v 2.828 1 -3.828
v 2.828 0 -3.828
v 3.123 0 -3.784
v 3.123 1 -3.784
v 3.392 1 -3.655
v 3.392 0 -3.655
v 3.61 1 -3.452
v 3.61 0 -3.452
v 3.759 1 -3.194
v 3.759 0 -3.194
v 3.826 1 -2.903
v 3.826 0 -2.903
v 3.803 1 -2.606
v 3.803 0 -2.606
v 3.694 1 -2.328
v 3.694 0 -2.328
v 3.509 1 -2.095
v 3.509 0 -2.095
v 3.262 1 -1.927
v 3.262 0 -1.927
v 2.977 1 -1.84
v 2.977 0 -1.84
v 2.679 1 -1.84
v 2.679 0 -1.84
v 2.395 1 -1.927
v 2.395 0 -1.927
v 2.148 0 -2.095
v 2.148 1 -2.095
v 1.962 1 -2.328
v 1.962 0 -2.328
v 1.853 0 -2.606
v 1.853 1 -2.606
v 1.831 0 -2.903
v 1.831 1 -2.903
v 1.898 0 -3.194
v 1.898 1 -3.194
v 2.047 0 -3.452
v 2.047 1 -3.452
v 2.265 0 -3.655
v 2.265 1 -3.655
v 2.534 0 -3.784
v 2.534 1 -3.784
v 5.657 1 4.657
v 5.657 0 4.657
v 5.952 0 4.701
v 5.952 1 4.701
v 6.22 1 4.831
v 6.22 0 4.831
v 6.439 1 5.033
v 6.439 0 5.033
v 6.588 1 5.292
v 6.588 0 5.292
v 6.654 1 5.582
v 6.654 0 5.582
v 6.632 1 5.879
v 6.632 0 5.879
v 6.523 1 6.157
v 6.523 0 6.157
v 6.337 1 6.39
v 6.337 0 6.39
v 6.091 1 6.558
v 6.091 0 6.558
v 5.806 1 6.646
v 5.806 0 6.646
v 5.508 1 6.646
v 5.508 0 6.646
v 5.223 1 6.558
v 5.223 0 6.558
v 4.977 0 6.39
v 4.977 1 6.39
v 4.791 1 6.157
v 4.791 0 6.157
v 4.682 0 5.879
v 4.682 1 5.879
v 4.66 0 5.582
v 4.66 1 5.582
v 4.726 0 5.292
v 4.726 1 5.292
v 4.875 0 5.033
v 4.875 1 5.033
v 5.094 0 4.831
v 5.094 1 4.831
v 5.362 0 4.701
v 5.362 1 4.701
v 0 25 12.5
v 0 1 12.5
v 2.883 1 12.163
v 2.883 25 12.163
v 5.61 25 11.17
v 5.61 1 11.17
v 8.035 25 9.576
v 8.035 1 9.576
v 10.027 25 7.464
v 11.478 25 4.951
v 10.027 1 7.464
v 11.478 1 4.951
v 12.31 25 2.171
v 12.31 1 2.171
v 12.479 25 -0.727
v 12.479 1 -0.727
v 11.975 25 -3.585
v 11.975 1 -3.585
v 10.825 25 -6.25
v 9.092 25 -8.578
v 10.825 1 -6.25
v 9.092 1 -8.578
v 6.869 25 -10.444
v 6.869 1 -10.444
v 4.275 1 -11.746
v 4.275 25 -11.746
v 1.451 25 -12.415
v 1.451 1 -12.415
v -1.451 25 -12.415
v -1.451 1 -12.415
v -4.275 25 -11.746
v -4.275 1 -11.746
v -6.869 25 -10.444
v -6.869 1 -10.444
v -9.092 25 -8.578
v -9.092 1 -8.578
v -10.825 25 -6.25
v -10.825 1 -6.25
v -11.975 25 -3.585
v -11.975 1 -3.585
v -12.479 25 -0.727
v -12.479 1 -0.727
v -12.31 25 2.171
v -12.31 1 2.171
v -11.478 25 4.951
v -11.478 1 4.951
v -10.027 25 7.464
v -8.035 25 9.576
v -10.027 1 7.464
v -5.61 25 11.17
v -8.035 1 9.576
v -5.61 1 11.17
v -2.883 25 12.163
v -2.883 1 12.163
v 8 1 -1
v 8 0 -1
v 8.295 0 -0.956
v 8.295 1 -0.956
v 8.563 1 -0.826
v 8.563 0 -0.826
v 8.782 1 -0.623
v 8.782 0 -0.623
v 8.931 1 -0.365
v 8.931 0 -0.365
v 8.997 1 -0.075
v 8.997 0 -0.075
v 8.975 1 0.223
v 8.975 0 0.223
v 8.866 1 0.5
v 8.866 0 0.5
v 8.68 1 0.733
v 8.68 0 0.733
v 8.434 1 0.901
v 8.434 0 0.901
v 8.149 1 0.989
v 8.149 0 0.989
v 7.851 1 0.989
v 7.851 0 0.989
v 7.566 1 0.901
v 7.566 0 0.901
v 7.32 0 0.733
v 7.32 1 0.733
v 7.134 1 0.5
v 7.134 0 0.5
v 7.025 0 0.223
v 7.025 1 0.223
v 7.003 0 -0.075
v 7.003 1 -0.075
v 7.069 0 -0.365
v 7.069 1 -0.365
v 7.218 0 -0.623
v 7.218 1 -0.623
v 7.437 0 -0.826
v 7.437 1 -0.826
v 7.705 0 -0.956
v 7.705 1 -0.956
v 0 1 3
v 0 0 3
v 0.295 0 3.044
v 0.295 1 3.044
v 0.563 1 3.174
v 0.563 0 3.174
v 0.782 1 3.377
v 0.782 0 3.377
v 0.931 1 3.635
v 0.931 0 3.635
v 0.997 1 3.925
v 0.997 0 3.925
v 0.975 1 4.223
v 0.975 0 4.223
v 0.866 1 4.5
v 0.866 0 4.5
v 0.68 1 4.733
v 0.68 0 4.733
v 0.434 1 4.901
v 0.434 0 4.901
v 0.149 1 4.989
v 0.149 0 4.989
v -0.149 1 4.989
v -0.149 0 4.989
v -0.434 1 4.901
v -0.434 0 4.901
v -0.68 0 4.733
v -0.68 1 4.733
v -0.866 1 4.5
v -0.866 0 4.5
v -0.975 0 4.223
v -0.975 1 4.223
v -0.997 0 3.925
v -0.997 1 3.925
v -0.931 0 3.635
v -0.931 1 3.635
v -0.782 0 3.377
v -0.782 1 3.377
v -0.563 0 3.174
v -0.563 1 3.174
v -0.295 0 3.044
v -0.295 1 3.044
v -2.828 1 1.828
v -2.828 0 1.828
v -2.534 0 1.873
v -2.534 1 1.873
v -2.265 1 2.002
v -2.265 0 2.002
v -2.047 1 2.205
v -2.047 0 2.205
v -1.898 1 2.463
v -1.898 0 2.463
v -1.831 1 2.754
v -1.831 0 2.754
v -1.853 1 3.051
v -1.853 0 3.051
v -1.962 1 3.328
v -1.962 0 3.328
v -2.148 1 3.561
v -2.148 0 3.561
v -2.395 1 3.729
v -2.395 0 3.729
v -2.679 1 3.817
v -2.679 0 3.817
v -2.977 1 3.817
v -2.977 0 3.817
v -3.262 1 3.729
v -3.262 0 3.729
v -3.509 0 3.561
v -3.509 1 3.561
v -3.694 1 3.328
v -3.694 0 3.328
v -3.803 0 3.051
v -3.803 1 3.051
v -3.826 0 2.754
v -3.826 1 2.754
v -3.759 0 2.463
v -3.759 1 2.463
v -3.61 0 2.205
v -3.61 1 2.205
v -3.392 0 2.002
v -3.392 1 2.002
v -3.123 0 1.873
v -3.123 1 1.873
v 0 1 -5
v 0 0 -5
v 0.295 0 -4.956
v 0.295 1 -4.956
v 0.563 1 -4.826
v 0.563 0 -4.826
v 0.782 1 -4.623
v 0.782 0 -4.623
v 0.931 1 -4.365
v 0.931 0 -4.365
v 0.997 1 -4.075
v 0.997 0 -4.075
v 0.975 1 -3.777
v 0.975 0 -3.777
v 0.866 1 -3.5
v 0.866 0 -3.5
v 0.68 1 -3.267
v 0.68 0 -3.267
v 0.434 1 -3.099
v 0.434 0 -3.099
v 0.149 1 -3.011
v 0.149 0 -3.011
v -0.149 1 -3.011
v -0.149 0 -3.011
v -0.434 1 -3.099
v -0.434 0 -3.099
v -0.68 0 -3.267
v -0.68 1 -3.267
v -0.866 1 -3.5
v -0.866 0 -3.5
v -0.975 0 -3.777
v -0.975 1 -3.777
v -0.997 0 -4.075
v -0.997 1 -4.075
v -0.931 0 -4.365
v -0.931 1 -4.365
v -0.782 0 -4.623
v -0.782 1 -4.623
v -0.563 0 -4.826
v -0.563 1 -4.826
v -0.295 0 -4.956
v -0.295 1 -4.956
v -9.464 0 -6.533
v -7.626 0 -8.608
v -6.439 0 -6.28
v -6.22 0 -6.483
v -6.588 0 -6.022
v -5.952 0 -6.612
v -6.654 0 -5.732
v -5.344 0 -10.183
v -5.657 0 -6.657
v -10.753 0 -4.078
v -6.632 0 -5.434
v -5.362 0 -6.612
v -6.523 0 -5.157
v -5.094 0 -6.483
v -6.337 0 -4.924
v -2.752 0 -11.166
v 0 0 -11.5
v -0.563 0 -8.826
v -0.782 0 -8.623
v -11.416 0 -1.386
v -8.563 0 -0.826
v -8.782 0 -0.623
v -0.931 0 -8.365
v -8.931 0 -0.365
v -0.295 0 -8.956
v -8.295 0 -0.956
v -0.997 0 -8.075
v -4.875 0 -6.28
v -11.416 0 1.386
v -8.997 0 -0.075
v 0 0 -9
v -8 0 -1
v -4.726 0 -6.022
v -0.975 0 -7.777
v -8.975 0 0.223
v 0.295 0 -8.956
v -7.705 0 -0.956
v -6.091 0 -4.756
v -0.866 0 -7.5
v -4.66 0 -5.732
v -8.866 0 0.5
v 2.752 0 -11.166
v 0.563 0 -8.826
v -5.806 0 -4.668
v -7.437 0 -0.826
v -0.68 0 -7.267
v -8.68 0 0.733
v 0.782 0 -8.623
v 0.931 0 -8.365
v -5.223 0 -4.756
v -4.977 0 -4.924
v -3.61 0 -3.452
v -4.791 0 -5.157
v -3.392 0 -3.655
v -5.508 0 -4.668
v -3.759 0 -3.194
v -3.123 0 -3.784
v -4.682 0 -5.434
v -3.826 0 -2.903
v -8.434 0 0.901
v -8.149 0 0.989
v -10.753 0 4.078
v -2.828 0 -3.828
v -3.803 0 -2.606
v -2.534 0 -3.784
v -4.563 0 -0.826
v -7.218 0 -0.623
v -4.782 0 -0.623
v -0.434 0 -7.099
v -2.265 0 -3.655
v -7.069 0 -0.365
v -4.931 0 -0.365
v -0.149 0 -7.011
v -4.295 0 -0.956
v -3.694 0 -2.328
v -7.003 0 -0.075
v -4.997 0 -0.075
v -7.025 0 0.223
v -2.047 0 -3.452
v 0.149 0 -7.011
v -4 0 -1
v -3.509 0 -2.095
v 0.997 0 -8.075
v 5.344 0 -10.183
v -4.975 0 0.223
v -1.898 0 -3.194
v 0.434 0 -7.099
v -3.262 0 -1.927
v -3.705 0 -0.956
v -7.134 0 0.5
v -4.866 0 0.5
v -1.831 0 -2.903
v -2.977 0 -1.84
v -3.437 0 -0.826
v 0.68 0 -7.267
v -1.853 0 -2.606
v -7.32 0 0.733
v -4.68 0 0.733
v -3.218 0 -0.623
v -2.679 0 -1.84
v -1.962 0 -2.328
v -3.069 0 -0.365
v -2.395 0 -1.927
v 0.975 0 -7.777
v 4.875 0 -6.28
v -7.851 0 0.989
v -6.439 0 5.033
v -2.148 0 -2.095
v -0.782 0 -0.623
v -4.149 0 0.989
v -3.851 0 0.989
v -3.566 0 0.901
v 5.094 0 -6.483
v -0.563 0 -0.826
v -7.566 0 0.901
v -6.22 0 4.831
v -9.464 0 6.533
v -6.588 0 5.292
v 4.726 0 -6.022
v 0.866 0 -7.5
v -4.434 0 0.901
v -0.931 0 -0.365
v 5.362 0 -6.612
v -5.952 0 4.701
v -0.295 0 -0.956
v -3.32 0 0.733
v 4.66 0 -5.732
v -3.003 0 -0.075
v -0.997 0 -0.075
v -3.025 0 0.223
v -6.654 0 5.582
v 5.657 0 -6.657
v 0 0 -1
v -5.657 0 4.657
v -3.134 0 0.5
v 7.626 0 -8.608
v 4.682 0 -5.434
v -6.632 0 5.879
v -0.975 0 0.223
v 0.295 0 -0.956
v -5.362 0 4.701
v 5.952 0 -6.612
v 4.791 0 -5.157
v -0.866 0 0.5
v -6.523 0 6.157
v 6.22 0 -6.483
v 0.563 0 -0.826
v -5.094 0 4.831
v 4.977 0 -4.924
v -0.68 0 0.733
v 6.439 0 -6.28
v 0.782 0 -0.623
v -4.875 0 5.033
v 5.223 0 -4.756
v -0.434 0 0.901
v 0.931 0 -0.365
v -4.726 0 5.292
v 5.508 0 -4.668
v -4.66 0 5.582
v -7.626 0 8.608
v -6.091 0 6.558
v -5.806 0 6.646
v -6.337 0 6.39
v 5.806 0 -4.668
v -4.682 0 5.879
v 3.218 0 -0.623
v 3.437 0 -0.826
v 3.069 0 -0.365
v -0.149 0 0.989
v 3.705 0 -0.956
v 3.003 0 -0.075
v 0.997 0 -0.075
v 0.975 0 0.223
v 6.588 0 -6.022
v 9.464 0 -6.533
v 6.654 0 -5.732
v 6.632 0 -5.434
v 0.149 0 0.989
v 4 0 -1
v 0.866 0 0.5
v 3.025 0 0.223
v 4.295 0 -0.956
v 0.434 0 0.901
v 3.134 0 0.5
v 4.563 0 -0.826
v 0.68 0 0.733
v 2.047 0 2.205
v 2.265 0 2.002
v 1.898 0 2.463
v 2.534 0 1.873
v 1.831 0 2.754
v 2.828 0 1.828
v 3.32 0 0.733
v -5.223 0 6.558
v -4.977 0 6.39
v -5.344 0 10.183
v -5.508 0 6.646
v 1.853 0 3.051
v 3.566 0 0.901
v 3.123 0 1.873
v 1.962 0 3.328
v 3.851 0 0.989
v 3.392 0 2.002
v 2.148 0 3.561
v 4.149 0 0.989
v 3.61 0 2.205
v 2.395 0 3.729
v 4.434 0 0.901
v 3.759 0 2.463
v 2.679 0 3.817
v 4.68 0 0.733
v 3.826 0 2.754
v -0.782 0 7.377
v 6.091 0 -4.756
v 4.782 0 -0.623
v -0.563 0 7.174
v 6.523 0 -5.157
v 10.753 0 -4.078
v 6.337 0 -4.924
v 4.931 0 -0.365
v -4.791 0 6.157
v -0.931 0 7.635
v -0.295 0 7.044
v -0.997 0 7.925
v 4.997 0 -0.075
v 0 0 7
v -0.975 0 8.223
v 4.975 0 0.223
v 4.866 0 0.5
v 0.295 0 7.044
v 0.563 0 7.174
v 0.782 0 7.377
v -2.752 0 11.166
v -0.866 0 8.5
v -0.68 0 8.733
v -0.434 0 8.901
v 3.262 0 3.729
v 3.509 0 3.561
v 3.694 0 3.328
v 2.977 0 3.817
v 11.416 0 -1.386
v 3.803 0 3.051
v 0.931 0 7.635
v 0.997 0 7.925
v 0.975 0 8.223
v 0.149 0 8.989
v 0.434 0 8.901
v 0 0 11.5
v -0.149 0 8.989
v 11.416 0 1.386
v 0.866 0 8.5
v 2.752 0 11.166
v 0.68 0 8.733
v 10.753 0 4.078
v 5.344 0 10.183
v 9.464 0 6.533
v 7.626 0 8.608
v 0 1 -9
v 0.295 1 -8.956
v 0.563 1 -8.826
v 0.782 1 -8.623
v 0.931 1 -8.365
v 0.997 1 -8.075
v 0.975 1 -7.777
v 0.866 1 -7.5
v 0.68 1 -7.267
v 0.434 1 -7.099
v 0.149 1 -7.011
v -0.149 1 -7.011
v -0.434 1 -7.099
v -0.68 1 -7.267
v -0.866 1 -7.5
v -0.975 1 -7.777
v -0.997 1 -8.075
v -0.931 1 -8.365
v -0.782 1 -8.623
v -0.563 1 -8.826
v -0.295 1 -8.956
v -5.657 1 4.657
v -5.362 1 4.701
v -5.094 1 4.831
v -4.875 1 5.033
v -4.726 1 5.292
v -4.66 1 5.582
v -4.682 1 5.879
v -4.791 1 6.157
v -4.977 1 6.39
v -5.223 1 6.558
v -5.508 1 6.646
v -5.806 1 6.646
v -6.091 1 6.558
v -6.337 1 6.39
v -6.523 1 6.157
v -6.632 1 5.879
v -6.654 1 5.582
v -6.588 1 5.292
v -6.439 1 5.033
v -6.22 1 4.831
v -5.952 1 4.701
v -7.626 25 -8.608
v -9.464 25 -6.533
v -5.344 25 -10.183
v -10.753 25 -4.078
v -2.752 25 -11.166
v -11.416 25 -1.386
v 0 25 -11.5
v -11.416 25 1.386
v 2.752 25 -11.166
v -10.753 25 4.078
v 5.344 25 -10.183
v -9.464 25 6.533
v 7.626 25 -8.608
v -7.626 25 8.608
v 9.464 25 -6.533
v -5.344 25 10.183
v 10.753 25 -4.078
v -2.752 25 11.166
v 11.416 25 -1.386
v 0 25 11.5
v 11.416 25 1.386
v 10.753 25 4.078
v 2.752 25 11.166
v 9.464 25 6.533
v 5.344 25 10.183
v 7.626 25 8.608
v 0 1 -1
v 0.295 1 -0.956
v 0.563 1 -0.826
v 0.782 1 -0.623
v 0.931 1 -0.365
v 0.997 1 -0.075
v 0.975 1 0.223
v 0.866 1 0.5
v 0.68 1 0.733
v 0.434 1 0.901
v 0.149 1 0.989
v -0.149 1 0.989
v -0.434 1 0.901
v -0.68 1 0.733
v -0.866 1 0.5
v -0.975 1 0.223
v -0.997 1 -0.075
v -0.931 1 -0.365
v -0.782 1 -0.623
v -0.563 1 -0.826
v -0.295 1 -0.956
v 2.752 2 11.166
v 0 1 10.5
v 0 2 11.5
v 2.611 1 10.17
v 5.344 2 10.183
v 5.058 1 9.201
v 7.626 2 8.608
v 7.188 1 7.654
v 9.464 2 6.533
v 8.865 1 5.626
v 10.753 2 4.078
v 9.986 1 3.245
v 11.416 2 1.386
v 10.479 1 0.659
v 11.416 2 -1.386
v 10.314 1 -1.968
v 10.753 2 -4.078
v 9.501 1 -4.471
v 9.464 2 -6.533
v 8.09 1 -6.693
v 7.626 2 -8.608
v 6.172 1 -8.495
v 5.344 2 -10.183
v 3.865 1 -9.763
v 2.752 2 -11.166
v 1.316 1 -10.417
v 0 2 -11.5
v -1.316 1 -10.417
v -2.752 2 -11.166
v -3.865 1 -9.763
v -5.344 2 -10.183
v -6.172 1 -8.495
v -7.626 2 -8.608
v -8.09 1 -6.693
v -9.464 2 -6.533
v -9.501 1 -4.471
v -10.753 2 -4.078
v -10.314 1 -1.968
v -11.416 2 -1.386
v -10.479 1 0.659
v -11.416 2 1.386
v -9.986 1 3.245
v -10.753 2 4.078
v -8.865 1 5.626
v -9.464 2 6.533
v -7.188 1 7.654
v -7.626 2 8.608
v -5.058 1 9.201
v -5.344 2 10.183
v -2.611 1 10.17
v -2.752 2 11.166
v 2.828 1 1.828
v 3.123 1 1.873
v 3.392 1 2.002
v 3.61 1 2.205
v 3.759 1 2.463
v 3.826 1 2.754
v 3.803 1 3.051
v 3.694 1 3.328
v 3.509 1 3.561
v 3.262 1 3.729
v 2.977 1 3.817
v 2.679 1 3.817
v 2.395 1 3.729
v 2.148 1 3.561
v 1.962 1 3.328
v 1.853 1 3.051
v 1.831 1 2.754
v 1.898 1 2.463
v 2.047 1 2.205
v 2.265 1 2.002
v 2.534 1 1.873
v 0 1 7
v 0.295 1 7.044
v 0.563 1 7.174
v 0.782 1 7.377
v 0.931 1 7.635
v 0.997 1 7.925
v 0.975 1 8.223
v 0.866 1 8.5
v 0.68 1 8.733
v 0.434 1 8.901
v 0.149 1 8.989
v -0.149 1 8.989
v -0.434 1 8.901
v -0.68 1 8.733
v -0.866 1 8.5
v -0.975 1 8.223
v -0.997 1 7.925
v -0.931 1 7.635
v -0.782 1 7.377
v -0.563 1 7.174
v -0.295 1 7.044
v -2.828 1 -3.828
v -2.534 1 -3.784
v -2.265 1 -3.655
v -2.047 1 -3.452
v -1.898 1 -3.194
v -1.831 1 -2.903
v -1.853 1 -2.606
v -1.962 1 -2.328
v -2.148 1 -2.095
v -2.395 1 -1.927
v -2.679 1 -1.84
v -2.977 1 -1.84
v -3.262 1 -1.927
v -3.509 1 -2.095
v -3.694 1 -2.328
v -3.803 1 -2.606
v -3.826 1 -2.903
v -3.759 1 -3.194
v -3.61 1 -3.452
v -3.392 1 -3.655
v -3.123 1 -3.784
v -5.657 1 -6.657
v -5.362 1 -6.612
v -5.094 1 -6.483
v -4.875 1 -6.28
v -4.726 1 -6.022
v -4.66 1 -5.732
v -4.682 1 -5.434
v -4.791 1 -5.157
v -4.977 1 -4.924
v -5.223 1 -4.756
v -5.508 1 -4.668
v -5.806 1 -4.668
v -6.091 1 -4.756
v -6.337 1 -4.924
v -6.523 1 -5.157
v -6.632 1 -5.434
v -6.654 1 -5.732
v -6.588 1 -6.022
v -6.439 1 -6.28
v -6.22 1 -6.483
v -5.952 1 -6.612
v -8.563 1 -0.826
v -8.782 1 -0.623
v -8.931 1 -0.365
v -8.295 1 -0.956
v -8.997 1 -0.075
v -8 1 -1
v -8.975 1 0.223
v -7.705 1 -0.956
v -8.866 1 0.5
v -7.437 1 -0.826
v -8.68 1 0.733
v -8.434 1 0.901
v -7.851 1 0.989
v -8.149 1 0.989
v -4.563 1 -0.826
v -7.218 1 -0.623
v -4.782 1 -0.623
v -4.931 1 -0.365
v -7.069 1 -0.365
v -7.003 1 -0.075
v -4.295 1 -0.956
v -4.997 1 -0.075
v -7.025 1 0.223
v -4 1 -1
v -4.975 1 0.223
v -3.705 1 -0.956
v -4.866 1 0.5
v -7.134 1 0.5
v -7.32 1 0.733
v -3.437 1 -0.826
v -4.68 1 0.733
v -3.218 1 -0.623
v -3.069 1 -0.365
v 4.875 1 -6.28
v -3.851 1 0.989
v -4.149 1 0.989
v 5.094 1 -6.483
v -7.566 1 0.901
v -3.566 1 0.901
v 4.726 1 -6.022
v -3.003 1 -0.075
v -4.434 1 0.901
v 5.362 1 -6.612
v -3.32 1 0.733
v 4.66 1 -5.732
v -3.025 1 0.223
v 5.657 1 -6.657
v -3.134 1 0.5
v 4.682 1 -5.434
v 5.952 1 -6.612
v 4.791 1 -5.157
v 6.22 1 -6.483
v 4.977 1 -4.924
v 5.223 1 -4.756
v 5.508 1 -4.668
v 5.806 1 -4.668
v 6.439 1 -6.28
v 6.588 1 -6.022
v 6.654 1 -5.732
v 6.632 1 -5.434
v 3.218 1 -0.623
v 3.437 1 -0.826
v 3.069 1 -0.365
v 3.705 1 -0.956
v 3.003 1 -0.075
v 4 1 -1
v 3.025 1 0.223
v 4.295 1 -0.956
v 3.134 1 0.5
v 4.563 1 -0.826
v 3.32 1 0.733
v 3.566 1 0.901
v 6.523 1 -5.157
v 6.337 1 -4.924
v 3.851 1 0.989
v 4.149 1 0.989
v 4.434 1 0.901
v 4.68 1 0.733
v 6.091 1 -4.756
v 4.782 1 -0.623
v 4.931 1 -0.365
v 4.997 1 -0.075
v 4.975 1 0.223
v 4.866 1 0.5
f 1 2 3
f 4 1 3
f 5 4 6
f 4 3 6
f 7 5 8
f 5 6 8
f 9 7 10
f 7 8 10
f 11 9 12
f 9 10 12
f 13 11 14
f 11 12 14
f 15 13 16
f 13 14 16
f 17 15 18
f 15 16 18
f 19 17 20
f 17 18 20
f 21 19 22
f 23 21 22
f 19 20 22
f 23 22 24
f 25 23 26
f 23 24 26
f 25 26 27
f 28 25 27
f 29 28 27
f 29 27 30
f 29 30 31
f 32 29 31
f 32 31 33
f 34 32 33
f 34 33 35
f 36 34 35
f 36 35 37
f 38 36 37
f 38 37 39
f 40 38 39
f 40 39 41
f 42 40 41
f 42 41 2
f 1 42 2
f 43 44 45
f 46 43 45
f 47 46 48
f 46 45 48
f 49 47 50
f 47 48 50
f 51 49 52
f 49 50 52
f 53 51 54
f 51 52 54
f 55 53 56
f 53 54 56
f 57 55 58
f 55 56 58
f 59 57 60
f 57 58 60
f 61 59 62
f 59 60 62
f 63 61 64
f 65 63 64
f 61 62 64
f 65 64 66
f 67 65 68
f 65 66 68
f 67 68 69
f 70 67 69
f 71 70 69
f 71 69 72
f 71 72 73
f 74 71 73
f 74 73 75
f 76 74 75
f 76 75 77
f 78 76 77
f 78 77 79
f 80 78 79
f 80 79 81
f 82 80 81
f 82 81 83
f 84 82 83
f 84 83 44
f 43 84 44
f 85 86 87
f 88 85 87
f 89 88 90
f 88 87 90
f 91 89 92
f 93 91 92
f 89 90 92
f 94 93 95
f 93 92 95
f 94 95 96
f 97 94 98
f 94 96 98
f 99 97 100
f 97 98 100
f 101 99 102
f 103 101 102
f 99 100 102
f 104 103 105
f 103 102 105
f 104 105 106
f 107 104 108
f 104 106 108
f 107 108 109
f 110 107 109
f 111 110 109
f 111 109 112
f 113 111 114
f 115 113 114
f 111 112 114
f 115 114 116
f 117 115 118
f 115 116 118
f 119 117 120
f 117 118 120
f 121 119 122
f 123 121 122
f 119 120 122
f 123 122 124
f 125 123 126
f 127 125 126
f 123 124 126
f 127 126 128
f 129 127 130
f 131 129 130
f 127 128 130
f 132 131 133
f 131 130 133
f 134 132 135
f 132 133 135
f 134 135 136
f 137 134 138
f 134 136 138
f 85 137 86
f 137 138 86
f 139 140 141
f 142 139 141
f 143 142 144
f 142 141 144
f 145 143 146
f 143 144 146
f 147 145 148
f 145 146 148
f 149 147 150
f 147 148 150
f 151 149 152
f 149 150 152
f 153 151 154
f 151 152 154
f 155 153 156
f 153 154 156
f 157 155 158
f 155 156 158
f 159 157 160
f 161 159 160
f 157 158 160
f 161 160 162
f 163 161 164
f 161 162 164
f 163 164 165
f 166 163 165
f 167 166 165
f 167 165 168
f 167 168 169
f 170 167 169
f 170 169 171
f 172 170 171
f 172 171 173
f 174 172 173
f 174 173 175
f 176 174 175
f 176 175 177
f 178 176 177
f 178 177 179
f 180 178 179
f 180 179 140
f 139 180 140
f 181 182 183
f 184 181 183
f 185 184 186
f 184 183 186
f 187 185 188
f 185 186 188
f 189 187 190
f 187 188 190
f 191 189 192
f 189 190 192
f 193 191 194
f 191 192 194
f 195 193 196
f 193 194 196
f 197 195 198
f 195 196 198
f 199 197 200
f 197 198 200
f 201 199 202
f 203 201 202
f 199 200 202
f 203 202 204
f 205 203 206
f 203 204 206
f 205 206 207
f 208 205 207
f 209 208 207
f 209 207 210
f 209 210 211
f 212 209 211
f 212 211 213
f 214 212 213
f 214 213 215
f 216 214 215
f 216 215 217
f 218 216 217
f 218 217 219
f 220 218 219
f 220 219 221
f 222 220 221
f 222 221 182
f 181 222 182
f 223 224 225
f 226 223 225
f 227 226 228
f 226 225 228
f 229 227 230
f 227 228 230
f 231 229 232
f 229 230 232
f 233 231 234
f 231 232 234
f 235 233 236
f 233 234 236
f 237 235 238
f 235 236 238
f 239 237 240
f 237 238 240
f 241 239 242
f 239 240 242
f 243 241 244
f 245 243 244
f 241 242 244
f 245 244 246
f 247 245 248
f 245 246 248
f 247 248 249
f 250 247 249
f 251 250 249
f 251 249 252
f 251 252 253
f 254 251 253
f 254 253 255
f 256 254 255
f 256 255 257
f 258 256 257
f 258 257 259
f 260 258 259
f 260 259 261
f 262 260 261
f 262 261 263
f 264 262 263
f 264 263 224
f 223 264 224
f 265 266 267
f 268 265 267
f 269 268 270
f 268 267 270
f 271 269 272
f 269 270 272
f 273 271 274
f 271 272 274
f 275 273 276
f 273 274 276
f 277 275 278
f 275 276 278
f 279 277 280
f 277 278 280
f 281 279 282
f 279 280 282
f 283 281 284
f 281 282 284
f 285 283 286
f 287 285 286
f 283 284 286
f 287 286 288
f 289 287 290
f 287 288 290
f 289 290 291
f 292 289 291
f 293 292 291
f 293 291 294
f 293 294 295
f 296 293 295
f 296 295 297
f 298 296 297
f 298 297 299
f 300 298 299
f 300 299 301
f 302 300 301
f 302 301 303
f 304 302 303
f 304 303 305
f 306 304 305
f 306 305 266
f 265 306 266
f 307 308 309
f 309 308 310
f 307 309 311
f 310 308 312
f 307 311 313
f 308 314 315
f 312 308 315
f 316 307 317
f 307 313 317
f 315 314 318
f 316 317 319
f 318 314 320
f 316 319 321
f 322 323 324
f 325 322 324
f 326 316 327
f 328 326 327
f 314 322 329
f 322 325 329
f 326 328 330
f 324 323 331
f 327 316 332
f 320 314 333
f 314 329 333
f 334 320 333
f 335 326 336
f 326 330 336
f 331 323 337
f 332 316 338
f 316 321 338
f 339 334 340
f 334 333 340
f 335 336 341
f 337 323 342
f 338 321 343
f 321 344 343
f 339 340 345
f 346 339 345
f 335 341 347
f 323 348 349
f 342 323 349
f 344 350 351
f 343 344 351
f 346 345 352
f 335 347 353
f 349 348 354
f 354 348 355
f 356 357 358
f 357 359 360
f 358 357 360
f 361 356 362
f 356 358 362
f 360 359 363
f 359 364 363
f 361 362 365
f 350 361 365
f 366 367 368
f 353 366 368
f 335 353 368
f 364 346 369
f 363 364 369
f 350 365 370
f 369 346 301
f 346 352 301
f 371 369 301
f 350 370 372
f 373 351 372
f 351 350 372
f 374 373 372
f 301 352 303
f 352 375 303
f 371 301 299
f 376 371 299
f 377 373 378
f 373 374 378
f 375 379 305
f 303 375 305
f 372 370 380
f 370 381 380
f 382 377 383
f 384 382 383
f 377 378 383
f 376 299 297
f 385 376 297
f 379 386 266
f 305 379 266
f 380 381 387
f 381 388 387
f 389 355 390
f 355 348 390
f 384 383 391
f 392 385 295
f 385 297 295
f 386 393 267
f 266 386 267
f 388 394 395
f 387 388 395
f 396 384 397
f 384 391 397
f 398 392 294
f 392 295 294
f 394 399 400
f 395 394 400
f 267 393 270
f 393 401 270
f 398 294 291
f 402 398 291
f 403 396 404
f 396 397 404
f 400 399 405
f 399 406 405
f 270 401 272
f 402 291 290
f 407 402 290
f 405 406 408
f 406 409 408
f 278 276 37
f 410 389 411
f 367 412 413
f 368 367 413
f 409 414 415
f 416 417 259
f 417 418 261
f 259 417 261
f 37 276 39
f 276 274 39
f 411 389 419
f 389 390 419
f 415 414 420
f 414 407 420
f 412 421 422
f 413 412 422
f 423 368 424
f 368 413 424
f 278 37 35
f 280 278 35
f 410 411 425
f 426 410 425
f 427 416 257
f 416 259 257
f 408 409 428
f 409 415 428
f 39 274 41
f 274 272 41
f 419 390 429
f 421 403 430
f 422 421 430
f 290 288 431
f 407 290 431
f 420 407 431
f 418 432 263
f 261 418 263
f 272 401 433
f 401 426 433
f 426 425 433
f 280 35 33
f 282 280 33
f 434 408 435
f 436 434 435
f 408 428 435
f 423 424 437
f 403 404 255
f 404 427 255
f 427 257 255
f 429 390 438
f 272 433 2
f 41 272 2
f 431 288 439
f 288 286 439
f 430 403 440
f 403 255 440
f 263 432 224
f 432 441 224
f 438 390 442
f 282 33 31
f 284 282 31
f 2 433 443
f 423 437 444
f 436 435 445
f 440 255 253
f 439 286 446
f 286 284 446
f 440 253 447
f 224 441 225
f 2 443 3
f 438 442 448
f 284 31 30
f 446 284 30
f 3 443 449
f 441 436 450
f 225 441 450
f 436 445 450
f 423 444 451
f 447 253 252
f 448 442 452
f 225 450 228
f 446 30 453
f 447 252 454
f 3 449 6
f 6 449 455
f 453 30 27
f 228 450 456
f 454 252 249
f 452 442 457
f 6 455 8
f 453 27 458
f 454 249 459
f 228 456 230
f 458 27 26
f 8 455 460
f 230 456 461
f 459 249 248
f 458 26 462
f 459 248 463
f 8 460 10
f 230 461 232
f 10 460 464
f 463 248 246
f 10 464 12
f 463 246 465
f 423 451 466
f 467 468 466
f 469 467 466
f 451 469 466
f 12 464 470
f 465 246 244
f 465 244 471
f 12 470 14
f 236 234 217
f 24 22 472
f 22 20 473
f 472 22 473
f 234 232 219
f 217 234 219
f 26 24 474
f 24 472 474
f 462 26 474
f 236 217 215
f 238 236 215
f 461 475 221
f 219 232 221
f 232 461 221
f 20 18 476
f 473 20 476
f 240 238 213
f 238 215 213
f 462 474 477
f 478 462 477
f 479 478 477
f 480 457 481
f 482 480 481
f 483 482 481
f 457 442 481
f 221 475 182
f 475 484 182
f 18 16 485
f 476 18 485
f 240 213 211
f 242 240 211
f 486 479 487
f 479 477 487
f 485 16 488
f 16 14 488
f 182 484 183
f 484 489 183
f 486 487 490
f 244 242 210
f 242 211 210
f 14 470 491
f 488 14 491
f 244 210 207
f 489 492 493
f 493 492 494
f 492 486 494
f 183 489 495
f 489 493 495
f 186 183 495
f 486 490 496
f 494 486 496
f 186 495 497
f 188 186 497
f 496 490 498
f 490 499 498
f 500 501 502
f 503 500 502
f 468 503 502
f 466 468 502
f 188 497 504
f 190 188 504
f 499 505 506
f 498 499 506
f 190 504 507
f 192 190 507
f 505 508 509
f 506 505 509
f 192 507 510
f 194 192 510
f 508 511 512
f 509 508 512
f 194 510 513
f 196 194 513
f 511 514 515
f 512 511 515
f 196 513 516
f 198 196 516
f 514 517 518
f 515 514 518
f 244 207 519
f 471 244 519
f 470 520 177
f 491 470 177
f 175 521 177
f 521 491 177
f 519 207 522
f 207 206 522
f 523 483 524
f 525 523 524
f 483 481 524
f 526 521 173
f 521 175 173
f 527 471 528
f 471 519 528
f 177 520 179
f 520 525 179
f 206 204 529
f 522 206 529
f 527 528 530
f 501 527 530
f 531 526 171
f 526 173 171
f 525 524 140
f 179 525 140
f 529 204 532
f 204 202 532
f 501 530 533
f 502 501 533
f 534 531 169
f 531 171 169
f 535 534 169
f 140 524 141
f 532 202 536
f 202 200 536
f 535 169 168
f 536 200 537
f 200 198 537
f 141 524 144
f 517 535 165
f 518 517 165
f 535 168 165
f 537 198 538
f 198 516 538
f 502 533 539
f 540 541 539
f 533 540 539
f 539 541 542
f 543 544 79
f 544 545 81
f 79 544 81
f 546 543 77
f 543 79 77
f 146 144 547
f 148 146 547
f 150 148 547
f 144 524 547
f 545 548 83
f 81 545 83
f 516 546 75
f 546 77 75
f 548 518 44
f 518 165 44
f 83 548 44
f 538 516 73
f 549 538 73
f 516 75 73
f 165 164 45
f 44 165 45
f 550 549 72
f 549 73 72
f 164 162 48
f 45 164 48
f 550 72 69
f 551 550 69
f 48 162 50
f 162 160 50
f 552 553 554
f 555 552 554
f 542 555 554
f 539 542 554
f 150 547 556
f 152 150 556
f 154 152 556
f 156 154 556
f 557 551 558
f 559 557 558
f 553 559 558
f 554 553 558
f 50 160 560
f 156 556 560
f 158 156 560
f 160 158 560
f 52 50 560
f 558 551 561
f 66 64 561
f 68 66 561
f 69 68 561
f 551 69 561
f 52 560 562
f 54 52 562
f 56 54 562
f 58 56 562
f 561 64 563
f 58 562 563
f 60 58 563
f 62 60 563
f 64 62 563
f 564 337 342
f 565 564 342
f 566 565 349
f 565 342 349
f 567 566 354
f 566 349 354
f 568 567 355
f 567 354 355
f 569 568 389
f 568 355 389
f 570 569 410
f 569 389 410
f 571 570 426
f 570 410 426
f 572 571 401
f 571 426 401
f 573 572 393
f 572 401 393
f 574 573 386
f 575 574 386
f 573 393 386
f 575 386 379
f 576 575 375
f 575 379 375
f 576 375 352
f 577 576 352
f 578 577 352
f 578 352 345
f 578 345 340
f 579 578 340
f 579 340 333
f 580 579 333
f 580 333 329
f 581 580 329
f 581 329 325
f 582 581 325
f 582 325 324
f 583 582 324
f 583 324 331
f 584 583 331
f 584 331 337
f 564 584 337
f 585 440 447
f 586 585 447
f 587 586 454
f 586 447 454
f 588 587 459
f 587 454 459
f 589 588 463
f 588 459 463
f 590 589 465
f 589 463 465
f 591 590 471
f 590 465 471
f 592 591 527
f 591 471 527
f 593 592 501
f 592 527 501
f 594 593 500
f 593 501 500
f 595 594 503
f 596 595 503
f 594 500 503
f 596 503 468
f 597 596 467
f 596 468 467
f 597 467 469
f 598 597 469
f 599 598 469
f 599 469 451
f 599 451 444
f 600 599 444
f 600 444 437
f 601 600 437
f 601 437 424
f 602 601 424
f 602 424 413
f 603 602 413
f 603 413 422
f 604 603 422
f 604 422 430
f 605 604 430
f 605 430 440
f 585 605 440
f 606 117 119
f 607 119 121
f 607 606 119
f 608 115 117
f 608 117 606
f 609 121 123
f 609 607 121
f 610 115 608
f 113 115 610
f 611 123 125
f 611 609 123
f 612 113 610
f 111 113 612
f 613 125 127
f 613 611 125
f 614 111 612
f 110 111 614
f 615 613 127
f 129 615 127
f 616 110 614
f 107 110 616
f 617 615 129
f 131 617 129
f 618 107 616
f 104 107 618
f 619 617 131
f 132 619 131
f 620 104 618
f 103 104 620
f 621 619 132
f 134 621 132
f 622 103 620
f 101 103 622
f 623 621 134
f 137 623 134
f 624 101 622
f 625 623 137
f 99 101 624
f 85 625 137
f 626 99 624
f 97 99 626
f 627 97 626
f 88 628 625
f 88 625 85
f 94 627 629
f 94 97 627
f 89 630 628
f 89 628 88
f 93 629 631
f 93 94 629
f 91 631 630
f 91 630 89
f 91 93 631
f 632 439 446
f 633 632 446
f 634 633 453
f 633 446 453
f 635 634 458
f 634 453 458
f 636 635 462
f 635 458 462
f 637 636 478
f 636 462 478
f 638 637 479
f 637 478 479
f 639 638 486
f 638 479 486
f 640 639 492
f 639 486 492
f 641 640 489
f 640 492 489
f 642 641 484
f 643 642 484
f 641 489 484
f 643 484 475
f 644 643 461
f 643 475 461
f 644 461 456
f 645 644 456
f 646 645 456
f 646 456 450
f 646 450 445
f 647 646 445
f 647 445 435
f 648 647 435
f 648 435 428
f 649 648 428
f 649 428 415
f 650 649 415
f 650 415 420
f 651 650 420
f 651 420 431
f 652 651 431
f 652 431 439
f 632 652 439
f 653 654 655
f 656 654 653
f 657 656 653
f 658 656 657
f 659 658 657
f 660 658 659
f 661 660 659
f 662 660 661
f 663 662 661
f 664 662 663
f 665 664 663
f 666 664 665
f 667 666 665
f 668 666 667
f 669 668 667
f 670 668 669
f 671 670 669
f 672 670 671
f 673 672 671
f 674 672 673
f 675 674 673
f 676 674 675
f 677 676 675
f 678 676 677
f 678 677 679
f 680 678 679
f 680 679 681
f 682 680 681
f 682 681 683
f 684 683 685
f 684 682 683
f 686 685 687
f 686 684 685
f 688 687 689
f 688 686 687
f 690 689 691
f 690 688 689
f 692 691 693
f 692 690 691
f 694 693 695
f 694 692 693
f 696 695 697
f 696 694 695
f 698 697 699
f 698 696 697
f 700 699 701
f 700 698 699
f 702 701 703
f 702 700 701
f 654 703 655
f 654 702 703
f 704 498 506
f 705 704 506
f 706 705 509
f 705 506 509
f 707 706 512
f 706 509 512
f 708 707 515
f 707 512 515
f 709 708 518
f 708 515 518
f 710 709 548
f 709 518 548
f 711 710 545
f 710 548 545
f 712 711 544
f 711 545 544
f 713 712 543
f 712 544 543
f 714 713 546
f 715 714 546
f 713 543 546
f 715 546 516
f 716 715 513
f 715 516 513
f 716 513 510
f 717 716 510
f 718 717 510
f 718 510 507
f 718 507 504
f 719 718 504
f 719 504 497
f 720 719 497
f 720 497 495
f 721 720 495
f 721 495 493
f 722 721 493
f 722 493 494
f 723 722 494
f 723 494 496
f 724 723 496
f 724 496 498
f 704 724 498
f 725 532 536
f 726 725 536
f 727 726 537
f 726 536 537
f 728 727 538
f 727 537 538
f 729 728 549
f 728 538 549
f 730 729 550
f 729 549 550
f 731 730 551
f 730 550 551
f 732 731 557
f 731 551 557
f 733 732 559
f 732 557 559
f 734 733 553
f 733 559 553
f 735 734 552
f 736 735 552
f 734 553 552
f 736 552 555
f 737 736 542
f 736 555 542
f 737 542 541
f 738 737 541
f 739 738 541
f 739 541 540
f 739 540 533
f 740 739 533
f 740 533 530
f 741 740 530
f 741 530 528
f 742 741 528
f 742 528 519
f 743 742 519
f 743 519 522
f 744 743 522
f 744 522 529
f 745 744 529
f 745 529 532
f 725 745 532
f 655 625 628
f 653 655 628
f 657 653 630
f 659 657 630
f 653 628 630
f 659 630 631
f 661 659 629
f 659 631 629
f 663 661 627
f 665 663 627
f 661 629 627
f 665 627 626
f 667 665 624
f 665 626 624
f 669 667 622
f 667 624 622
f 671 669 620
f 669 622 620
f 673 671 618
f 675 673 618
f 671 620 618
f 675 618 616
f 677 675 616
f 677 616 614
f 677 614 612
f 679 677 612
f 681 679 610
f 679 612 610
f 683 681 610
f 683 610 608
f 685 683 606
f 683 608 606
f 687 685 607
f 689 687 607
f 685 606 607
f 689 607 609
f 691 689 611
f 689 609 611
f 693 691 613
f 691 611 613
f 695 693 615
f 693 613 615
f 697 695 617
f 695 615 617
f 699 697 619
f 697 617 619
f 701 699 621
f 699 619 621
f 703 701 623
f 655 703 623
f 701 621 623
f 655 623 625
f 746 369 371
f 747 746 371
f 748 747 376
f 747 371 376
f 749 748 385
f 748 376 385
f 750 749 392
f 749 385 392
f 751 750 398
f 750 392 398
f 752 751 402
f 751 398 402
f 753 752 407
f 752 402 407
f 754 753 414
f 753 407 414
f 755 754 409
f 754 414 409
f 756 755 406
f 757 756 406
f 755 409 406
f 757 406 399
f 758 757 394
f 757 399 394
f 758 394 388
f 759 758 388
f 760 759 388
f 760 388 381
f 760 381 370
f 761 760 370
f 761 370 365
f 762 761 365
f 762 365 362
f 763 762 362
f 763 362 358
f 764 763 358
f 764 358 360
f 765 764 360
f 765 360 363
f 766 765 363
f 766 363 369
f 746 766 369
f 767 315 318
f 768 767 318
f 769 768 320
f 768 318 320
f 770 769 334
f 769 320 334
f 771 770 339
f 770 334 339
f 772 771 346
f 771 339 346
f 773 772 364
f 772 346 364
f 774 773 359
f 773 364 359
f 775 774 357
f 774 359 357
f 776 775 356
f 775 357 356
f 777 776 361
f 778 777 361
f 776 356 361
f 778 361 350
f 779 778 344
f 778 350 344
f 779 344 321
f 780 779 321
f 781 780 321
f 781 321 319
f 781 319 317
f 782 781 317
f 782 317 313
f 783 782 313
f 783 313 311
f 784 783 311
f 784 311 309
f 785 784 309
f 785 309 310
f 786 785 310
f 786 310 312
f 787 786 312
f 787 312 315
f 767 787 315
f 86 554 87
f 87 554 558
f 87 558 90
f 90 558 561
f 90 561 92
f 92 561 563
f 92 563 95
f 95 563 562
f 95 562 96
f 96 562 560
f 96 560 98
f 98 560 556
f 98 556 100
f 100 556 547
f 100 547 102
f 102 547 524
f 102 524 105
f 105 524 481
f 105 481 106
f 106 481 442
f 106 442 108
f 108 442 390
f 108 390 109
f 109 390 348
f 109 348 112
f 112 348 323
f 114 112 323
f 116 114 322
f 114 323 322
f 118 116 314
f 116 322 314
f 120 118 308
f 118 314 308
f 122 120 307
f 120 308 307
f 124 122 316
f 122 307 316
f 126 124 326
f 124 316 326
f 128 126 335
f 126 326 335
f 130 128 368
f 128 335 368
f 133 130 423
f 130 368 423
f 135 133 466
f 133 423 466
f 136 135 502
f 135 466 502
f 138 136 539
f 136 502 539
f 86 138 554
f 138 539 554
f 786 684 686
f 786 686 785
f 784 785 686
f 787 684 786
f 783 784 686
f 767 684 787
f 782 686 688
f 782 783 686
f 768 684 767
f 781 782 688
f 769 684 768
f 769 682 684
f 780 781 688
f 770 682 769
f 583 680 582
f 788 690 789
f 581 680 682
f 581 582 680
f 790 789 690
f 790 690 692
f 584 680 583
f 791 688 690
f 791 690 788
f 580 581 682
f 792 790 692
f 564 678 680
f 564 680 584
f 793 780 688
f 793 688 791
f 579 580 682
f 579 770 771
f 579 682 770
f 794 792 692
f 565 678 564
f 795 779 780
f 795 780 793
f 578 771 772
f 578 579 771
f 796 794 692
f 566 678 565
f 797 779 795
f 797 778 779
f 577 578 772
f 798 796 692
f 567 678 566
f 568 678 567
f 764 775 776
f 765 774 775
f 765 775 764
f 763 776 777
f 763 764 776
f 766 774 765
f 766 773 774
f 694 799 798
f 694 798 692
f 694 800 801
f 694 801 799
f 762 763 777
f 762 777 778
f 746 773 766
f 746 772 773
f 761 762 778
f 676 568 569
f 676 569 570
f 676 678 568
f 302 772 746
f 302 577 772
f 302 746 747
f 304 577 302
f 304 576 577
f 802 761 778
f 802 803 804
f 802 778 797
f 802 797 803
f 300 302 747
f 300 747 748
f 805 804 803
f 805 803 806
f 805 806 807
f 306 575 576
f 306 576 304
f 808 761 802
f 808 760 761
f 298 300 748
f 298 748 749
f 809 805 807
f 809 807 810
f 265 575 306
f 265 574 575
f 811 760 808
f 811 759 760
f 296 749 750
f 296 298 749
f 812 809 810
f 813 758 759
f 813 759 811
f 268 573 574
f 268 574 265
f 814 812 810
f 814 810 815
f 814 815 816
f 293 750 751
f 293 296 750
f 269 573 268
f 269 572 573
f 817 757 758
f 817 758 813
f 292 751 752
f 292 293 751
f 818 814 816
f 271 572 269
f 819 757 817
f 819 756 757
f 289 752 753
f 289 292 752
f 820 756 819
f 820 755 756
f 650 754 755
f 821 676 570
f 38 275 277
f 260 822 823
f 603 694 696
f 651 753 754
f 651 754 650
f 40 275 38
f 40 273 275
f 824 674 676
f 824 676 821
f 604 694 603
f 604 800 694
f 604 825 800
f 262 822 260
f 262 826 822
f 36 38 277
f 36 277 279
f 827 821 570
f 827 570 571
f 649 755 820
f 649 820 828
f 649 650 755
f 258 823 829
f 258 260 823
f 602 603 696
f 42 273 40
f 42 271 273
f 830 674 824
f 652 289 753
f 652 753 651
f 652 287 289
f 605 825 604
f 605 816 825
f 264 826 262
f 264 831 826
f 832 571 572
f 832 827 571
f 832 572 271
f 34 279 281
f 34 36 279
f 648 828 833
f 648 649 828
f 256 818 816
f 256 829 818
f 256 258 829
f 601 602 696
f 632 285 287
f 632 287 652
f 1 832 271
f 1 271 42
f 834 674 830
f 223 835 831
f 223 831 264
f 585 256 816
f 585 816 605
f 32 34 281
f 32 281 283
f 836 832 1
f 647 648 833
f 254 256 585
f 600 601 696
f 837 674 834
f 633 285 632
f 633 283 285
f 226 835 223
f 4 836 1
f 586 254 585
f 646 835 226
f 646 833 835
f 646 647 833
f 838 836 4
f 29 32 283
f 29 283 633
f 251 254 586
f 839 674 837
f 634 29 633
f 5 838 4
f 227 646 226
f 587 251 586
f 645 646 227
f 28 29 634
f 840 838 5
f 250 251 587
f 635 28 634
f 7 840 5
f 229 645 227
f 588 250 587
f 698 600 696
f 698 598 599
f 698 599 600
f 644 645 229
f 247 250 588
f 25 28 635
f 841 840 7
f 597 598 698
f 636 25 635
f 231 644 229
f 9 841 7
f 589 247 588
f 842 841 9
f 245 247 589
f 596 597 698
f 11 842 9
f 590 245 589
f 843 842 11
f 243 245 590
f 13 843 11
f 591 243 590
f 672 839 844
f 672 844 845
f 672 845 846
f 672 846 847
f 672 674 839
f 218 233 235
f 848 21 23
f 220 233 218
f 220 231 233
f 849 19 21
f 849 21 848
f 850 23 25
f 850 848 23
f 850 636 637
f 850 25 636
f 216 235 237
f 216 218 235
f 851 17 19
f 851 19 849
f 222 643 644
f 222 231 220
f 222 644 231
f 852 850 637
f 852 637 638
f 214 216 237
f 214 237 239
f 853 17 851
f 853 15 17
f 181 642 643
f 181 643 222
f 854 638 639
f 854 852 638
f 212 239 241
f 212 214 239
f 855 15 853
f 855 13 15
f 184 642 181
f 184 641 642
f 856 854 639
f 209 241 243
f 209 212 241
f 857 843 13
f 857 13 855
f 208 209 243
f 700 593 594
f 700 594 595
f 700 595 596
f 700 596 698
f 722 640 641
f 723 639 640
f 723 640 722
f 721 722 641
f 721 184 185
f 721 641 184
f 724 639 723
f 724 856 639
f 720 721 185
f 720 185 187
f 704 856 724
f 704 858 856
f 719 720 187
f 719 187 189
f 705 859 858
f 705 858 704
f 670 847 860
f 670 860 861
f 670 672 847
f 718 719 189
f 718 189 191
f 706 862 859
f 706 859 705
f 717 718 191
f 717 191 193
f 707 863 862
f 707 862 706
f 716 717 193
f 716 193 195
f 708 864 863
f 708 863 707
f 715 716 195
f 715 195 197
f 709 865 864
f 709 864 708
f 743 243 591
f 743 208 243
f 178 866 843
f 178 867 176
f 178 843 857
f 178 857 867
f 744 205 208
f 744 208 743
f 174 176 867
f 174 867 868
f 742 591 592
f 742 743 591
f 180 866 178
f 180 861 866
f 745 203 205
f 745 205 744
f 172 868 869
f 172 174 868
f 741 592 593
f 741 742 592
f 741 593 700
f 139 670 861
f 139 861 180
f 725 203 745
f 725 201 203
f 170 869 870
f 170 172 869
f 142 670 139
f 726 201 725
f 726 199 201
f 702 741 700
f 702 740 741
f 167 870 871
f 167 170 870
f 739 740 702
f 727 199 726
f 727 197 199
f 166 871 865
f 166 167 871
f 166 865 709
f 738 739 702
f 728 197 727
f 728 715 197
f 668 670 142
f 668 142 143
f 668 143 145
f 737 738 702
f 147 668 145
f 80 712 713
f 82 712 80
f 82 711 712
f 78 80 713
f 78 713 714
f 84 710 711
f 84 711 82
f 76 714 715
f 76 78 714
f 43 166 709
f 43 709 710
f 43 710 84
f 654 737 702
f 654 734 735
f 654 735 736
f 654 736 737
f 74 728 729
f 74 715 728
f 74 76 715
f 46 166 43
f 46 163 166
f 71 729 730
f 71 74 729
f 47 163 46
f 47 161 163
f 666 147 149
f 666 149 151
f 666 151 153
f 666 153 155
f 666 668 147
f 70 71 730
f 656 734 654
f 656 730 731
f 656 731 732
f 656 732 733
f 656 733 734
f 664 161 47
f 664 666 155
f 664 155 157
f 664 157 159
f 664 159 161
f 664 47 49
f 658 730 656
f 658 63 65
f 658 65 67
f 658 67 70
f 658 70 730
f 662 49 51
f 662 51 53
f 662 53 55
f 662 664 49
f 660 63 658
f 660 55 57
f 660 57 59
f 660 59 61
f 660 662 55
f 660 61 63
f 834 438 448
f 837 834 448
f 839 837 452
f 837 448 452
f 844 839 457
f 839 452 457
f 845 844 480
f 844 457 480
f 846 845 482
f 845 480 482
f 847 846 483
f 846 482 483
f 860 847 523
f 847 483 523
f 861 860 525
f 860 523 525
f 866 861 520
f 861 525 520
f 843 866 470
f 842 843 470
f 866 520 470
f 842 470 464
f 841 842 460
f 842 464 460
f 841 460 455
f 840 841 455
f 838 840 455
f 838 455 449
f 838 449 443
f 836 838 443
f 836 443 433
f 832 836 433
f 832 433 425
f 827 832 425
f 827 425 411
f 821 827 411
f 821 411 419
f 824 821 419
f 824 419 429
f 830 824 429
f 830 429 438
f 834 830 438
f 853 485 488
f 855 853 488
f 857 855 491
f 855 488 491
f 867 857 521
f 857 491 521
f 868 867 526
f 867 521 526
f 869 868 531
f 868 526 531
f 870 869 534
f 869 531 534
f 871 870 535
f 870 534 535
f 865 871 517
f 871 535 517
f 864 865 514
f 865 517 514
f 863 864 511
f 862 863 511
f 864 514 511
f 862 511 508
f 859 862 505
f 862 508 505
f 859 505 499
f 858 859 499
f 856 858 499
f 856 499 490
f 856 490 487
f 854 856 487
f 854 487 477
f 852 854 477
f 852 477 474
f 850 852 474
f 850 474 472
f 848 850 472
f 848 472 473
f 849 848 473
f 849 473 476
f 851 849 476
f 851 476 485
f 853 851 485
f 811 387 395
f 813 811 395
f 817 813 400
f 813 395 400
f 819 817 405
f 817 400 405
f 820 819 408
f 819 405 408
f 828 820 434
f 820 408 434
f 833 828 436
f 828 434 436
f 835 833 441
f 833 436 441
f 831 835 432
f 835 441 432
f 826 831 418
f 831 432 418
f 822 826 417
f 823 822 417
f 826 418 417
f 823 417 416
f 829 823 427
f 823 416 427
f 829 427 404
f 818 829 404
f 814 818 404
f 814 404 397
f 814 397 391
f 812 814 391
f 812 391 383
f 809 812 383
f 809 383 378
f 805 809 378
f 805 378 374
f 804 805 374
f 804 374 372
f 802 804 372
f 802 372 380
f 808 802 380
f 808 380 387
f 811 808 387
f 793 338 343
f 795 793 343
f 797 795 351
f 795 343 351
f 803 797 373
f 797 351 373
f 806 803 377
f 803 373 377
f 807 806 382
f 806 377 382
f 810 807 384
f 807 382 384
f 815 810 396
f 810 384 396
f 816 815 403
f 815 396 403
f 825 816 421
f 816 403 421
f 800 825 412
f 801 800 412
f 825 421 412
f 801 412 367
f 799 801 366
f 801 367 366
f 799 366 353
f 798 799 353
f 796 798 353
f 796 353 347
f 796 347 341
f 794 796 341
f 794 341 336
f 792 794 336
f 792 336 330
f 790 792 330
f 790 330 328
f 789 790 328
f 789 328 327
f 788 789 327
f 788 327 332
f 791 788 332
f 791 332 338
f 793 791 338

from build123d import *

# Parameters (mm, degrees)
SKETCH1_R           = 12.5
BOSS_EXTRUDE1_DEPTH = 25
SKETCH2_R           = 11.5
CUT_EXTRUDE1_DEPTH  = 24
CUT_EXTRUDE2_REACH  = 32.619
SKETCH3_R           = 1
CHAMFER1_SIZE       = 1


with BuildPart() as part:
    # Sketch1 → Boss-Extrude1 (new body)
    with BuildSketch(Plane(origin=(0, 0, 0), x_dir=(1, 0, 0), z_dir=(0, 1, 0))):
        with Locations(Location((0, 0, 0), (0, 0, 270))):
            Circle(SKETCH1_R)
    extrude(amount=BOSS_EXTRUDE1_DEPTH)

    # Sketch2 → Cut-Extrude1 (cut)
    with BuildSketch(Plane(origin=(0, 25, 0), x_dir=(1, 0, 0), z_dir=(0, 1, 0))):
        with Locations(Location((0, 0, 0), (0, 0, 270))):
            Circle(SKETCH2_R)
    extrude(amount=-CUT_EXTRUDE1_DEPTH, mode=Mode.SUBTRACT)

    # Sketch3 → Cut-Extrude2 (cut, up to next)
    with BuildSketch(Plane.XZ, mode=Mode.PRIVATE) as cut_extrude2_sk1:
        with Locations(Location((0, 0, 0), (0, 0, 270))):
            Circle(SKETCH3_R)
    cut_extrude2_tool1 = extrude(cut_extrude2_sk1.sketch, amount=-CUT_EXTRUDE2_REACH, mode=Mode.PRIVATE) & part.part
    # Sketch3 → Cut-Extrude2 (cut, up to next)
    with BuildSketch(Plane.XZ, mode=Mode.PRIVATE) as cut_extrude2_sk2:
        with Locations(Location((-2.828427125, 2.828427125, 0), (0, 0, 270))):
            Circle(SKETCH3_R)
    cut_extrude2_tool2 = extrude(cut_extrude2_sk2.sketch, amount=-CUT_EXTRUDE2_REACH, mode=Mode.PRIVATE) & part.part
    # Sketch3 → Cut-Extrude2 (cut, up to next)
    with BuildSketch(Plane.XZ, mode=Mode.PRIVATE) as cut_extrude2_sk3:
        with Locations(Location((-5.656854249, 5.656854249, 0), (0, 0, 270))):
            Circle(SKETCH3_R)
    cut_extrude2_tool3 = extrude(cut_extrude2_sk3.sketch, amount=-CUT_EXTRUDE2_REACH, mode=Mode.PRIVATE) & part.part
    # Sketch3 → Cut-Extrude2 (cut, up to next)
    with BuildSketch(Plane.XZ, mode=Mode.PRIVATE) as cut_extrude2_sk4:
        with Locations(Location((0, 8, 0), (0, 0, 270))):
            Circle(SKETCH3_R)
    cut_extrude2_tool4 = extrude(cut_extrude2_sk4.sketch, amount=-CUT_EXTRUDE2_REACH, mode=Mode.PRIVATE) & part.part
    # Sketch3 → Cut-Extrude2 (cut, up to next)
    with BuildSketch(Plane.XZ, mode=Mode.PRIVATE) as cut_extrude2_sk5:
        with Locations(Location((0, 4, 0), (0, 0, 270))):
            Circle(SKETCH3_R)
    cut_extrude2_tool5 = extrude(cut_extrude2_sk5.sketch, amount=-CUT_EXTRUDE2_REACH, mode=Mode.PRIVATE) & part.part
    # Sketch3 → Cut-Extrude2 (cut, up to next)
    with BuildSketch(Plane.XZ, mode=Mode.PRIVATE) as cut_extrude2_sk6:
        with Locations(Location((2.828427125, 2.828427125, 0), (0, 0, 270))):
            Circle(SKETCH3_R)
    cut_extrude2_tool6 = extrude(cut_extrude2_sk6.sketch, amount=-CUT_EXTRUDE2_REACH, mode=Mode.PRIVATE) & part.part
    # Sketch3 → Cut-Extrude2 (cut, up to next)
    with BuildSketch(Plane.XZ, mode=Mode.PRIVATE) as cut_extrude2_sk7:
        with Locations(Location((5.656854249, 5.656854249, 0), (0, 0, 270))):
            Circle(SKETCH3_R)
    cut_extrude2_tool7 = extrude(cut_extrude2_sk7.sketch, amount=-CUT_EXTRUDE2_REACH, mode=Mode.PRIVATE) & part.part
    # Sketch3 → Cut-Extrude2 (cut, up to next)
    with BuildSketch(Plane.XZ, mode=Mode.PRIVATE) as cut_extrude2_sk8:
        with Locations(Location((8, 0, 0), (0, 0, 270))):
            Circle(SKETCH3_R)
    cut_extrude2_tool8 = extrude(cut_extrude2_sk8.sketch, amount=-CUT_EXTRUDE2_REACH, mode=Mode.PRIVATE) & part.part
    # Sketch3 → Cut-Extrude2 (cut, up to next)
    with BuildSketch(Plane.XZ, mode=Mode.PRIVATE) as cut_extrude2_sk9:
        with Locations(Location((4, 0, 0), (0, 0, 270))):
            Circle(SKETCH3_R)
    cut_extrude2_tool9 = extrude(cut_extrude2_sk9.sketch, amount=-CUT_EXTRUDE2_REACH, mode=Mode.PRIVATE) & part.part
    # Sketch3 → Cut-Extrude2 (cut, up to next)
    with BuildSketch(Plane.XZ, mode=Mode.PRIVATE) as cut_extrude2_sk10:
        with Locations(Location((2.828427125, -2.828427125, 0), (0, 0, 270))):
            Circle(SKETCH3_R)
    cut_extrude2_tool10 = extrude(cut_extrude2_sk10.sketch, amount=-CUT_EXTRUDE2_REACH, mode=Mode.PRIVATE) & part.part
    # Sketch3 → Cut-Extrude2 (cut, up to next)
    with BuildSketch(Plane.XZ, mode=Mode.PRIVATE) as cut_extrude2_sk11:
        with Locations(Location((5.656854249, -5.656854249, 0), (0, 0, 270))):
            Circle(SKETCH3_R)
    cut_extrude2_tool11 = extrude(cut_extrude2_sk11.sketch, amount=-CUT_EXTRUDE2_REACH, mode=Mode.PRIVATE) & part.part
    # Sketch3 → Cut-Extrude2 (cut, up to next)
    with BuildSketch(Plane.XZ, mode=Mode.PRIVATE) as cut_extrude2_sk12:
        with Locations(Location((0, -4, 0), (0, 0, 270))):
            Circle(SKETCH3_R)
    cut_extrude2_tool12 = extrude(cut_extrude2_sk12.sketch, amount=-CUT_EXTRUDE2_REACH, mode=Mode.PRIVATE) & part.part
    # Sketch3 → Cut-Extrude2 (cut, up to next)
    with BuildSketch(Plane.XZ, mode=Mode.PRIVATE) as cut_extrude2_sk13:
        with Locations(Location((-2.828427125, -2.828427125, 0), (0, 0, 270))):
            Circle(SKETCH3_R)
    cut_extrude2_tool13 = extrude(cut_extrude2_sk13.sketch, amount=-CUT_EXTRUDE2_REACH, mode=Mode.PRIVATE) & part.part
    # Sketch3 → Cut-Extrude2 (cut, up to next)
    with BuildSketch(Plane.XZ, mode=Mode.PRIVATE) as cut_extrude2_sk14:
        with Locations(Location((-4, 0, 0), (0, 0, 270))):
            Circle(SKETCH3_R)
    cut_extrude2_tool14 = extrude(cut_extrude2_sk14.sketch, amount=-CUT_EXTRUDE2_REACH, mode=Mode.PRIVATE) & part.part
    # Sketch3 → Cut-Extrude2 (cut, up to next)
    with BuildSketch(Plane.XZ, mode=Mode.PRIVATE) as cut_extrude2_sk15:
        with Locations(Location((-8, 0, 0), (0, 0, 270))):
            Circle(SKETCH3_R)
    cut_extrude2_tool15 = extrude(cut_extrude2_sk15.sketch, amount=-CUT_EXTRUDE2_REACH, mode=Mode.PRIVATE) & part.part
    # Sketch3 → Cut-Extrude2 (cut, up to next)
    with BuildSketch(Plane.XZ, mode=Mode.PRIVATE) as cut_extrude2_sk16:
        with Locations(Location((-5.656854249, -5.656854249, 0), (0, 0, 270))):
            Circle(SKETCH3_R)
    cut_extrude2_tool16 = extrude(cut_extrude2_sk16.sketch, amount=-CUT_EXTRUDE2_REACH, mode=Mode.PRIVATE) & part.part
    # Sketch3 → Cut-Extrude2 (cut, up to next)
    with BuildSketch(Plane.XZ, mode=Mode.PRIVATE) as cut_extrude2_sk17:
        with Locations(Location((0, -8, 0), (0, 0, 270))):
            Circle(SKETCH3_R)
    cut_extrude2_tool17 = extrude(cut_extrude2_sk17.sketch, amount=-CUT_EXTRUDE2_REACH, mode=Mode.PRIVATE) & part.part
    add(cut_extrude2_tool1.solids().sort_by_distance((0, 0, 0))[0], mode=Mode.SUBTRACT)
    add(cut_extrude2_tool2.solids().sort_by_distance((-2.828427, 0, 2.828427))[0], mode=Mode.SUBTRACT)
    add(cut_extrude2_tool3.solids().sort_by_distance((-5.656854, 0, 5.656854))[0], mode=Mode.SUBTRACT)
    add(cut_extrude2_tool4.solids().sort_by_distance((0, 0, 8))[0], mode=Mode.SUBTRACT)
    add(cut_extrude2_tool5.solids().sort_by_distance((0, 0, 4))[0], mode=Mode.SUBTRACT)
    add(cut_extrude2_tool6.solids().sort_by_distance((2.828427, 0, 2.828427))[0], mode=Mode.SUBTRACT)
    add(cut_extrude2_tool7.solids().sort_by_distance((5.656854, 0, 5.656854))[0], mode=Mode.SUBTRACT)
    add(cut_extrude2_tool8.solids().sort_by_distance((8, 0, 0))[0], mode=Mode.SUBTRACT)
    add(cut_extrude2_tool9.solids().sort_by_distance((4, 0, 0))[0], mode=Mode.SUBTRACT)
    add(cut_extrude2_tool10.solids().sort_by_distance((2.828427, 0, -2.828427))[0], mode=Mode.SUBTRACT)
    add(cut_extrude2_tool11.solids().sort_by_distance((5.656854, 0, -5.656854))[0], mode=Mode.SUBTRACT)
    add(cut_extrude2_tool12.solids().sort_by_distance((0, 0, -4))[0], mode=Mode.SUBTRACT)
    add(cut_extrude2_tool13.solids().sort_by_distance((-2.828427, 0, -2.828427))[0], mode=Mode.SUBTRACT)
    add(cut_extrude2_tool14.solids().sort_by_distance((-4, 0, 0))[0], mode=Mode.SUBTRACT)
    add(cut_extrude2_tool15.solids().sort_by_distance((-8, 0, 0))[0], mode=Mode.SUBTRACT)
    add(cut_extrude2_tool16.solids().sort_by_distance((-5.656854, 0, -5.656854))[0], mode=Mode.SUBTRACT)
    add(cut_extrude2_tool17.solids().sort_by_distance((0, 0, -8))[0], mode=Mode.SUBTRACT)

    # Chamfer1
    chamfer1_edges = [part.edges().sort_by_distance(p)[0] for p in [
        (0, 0, -12.5),
        (0, 1, -11.5),
    ]]
    chamfer(chamfer1_edges, length=CHAMFER1_SIZE)


solid = part.part
